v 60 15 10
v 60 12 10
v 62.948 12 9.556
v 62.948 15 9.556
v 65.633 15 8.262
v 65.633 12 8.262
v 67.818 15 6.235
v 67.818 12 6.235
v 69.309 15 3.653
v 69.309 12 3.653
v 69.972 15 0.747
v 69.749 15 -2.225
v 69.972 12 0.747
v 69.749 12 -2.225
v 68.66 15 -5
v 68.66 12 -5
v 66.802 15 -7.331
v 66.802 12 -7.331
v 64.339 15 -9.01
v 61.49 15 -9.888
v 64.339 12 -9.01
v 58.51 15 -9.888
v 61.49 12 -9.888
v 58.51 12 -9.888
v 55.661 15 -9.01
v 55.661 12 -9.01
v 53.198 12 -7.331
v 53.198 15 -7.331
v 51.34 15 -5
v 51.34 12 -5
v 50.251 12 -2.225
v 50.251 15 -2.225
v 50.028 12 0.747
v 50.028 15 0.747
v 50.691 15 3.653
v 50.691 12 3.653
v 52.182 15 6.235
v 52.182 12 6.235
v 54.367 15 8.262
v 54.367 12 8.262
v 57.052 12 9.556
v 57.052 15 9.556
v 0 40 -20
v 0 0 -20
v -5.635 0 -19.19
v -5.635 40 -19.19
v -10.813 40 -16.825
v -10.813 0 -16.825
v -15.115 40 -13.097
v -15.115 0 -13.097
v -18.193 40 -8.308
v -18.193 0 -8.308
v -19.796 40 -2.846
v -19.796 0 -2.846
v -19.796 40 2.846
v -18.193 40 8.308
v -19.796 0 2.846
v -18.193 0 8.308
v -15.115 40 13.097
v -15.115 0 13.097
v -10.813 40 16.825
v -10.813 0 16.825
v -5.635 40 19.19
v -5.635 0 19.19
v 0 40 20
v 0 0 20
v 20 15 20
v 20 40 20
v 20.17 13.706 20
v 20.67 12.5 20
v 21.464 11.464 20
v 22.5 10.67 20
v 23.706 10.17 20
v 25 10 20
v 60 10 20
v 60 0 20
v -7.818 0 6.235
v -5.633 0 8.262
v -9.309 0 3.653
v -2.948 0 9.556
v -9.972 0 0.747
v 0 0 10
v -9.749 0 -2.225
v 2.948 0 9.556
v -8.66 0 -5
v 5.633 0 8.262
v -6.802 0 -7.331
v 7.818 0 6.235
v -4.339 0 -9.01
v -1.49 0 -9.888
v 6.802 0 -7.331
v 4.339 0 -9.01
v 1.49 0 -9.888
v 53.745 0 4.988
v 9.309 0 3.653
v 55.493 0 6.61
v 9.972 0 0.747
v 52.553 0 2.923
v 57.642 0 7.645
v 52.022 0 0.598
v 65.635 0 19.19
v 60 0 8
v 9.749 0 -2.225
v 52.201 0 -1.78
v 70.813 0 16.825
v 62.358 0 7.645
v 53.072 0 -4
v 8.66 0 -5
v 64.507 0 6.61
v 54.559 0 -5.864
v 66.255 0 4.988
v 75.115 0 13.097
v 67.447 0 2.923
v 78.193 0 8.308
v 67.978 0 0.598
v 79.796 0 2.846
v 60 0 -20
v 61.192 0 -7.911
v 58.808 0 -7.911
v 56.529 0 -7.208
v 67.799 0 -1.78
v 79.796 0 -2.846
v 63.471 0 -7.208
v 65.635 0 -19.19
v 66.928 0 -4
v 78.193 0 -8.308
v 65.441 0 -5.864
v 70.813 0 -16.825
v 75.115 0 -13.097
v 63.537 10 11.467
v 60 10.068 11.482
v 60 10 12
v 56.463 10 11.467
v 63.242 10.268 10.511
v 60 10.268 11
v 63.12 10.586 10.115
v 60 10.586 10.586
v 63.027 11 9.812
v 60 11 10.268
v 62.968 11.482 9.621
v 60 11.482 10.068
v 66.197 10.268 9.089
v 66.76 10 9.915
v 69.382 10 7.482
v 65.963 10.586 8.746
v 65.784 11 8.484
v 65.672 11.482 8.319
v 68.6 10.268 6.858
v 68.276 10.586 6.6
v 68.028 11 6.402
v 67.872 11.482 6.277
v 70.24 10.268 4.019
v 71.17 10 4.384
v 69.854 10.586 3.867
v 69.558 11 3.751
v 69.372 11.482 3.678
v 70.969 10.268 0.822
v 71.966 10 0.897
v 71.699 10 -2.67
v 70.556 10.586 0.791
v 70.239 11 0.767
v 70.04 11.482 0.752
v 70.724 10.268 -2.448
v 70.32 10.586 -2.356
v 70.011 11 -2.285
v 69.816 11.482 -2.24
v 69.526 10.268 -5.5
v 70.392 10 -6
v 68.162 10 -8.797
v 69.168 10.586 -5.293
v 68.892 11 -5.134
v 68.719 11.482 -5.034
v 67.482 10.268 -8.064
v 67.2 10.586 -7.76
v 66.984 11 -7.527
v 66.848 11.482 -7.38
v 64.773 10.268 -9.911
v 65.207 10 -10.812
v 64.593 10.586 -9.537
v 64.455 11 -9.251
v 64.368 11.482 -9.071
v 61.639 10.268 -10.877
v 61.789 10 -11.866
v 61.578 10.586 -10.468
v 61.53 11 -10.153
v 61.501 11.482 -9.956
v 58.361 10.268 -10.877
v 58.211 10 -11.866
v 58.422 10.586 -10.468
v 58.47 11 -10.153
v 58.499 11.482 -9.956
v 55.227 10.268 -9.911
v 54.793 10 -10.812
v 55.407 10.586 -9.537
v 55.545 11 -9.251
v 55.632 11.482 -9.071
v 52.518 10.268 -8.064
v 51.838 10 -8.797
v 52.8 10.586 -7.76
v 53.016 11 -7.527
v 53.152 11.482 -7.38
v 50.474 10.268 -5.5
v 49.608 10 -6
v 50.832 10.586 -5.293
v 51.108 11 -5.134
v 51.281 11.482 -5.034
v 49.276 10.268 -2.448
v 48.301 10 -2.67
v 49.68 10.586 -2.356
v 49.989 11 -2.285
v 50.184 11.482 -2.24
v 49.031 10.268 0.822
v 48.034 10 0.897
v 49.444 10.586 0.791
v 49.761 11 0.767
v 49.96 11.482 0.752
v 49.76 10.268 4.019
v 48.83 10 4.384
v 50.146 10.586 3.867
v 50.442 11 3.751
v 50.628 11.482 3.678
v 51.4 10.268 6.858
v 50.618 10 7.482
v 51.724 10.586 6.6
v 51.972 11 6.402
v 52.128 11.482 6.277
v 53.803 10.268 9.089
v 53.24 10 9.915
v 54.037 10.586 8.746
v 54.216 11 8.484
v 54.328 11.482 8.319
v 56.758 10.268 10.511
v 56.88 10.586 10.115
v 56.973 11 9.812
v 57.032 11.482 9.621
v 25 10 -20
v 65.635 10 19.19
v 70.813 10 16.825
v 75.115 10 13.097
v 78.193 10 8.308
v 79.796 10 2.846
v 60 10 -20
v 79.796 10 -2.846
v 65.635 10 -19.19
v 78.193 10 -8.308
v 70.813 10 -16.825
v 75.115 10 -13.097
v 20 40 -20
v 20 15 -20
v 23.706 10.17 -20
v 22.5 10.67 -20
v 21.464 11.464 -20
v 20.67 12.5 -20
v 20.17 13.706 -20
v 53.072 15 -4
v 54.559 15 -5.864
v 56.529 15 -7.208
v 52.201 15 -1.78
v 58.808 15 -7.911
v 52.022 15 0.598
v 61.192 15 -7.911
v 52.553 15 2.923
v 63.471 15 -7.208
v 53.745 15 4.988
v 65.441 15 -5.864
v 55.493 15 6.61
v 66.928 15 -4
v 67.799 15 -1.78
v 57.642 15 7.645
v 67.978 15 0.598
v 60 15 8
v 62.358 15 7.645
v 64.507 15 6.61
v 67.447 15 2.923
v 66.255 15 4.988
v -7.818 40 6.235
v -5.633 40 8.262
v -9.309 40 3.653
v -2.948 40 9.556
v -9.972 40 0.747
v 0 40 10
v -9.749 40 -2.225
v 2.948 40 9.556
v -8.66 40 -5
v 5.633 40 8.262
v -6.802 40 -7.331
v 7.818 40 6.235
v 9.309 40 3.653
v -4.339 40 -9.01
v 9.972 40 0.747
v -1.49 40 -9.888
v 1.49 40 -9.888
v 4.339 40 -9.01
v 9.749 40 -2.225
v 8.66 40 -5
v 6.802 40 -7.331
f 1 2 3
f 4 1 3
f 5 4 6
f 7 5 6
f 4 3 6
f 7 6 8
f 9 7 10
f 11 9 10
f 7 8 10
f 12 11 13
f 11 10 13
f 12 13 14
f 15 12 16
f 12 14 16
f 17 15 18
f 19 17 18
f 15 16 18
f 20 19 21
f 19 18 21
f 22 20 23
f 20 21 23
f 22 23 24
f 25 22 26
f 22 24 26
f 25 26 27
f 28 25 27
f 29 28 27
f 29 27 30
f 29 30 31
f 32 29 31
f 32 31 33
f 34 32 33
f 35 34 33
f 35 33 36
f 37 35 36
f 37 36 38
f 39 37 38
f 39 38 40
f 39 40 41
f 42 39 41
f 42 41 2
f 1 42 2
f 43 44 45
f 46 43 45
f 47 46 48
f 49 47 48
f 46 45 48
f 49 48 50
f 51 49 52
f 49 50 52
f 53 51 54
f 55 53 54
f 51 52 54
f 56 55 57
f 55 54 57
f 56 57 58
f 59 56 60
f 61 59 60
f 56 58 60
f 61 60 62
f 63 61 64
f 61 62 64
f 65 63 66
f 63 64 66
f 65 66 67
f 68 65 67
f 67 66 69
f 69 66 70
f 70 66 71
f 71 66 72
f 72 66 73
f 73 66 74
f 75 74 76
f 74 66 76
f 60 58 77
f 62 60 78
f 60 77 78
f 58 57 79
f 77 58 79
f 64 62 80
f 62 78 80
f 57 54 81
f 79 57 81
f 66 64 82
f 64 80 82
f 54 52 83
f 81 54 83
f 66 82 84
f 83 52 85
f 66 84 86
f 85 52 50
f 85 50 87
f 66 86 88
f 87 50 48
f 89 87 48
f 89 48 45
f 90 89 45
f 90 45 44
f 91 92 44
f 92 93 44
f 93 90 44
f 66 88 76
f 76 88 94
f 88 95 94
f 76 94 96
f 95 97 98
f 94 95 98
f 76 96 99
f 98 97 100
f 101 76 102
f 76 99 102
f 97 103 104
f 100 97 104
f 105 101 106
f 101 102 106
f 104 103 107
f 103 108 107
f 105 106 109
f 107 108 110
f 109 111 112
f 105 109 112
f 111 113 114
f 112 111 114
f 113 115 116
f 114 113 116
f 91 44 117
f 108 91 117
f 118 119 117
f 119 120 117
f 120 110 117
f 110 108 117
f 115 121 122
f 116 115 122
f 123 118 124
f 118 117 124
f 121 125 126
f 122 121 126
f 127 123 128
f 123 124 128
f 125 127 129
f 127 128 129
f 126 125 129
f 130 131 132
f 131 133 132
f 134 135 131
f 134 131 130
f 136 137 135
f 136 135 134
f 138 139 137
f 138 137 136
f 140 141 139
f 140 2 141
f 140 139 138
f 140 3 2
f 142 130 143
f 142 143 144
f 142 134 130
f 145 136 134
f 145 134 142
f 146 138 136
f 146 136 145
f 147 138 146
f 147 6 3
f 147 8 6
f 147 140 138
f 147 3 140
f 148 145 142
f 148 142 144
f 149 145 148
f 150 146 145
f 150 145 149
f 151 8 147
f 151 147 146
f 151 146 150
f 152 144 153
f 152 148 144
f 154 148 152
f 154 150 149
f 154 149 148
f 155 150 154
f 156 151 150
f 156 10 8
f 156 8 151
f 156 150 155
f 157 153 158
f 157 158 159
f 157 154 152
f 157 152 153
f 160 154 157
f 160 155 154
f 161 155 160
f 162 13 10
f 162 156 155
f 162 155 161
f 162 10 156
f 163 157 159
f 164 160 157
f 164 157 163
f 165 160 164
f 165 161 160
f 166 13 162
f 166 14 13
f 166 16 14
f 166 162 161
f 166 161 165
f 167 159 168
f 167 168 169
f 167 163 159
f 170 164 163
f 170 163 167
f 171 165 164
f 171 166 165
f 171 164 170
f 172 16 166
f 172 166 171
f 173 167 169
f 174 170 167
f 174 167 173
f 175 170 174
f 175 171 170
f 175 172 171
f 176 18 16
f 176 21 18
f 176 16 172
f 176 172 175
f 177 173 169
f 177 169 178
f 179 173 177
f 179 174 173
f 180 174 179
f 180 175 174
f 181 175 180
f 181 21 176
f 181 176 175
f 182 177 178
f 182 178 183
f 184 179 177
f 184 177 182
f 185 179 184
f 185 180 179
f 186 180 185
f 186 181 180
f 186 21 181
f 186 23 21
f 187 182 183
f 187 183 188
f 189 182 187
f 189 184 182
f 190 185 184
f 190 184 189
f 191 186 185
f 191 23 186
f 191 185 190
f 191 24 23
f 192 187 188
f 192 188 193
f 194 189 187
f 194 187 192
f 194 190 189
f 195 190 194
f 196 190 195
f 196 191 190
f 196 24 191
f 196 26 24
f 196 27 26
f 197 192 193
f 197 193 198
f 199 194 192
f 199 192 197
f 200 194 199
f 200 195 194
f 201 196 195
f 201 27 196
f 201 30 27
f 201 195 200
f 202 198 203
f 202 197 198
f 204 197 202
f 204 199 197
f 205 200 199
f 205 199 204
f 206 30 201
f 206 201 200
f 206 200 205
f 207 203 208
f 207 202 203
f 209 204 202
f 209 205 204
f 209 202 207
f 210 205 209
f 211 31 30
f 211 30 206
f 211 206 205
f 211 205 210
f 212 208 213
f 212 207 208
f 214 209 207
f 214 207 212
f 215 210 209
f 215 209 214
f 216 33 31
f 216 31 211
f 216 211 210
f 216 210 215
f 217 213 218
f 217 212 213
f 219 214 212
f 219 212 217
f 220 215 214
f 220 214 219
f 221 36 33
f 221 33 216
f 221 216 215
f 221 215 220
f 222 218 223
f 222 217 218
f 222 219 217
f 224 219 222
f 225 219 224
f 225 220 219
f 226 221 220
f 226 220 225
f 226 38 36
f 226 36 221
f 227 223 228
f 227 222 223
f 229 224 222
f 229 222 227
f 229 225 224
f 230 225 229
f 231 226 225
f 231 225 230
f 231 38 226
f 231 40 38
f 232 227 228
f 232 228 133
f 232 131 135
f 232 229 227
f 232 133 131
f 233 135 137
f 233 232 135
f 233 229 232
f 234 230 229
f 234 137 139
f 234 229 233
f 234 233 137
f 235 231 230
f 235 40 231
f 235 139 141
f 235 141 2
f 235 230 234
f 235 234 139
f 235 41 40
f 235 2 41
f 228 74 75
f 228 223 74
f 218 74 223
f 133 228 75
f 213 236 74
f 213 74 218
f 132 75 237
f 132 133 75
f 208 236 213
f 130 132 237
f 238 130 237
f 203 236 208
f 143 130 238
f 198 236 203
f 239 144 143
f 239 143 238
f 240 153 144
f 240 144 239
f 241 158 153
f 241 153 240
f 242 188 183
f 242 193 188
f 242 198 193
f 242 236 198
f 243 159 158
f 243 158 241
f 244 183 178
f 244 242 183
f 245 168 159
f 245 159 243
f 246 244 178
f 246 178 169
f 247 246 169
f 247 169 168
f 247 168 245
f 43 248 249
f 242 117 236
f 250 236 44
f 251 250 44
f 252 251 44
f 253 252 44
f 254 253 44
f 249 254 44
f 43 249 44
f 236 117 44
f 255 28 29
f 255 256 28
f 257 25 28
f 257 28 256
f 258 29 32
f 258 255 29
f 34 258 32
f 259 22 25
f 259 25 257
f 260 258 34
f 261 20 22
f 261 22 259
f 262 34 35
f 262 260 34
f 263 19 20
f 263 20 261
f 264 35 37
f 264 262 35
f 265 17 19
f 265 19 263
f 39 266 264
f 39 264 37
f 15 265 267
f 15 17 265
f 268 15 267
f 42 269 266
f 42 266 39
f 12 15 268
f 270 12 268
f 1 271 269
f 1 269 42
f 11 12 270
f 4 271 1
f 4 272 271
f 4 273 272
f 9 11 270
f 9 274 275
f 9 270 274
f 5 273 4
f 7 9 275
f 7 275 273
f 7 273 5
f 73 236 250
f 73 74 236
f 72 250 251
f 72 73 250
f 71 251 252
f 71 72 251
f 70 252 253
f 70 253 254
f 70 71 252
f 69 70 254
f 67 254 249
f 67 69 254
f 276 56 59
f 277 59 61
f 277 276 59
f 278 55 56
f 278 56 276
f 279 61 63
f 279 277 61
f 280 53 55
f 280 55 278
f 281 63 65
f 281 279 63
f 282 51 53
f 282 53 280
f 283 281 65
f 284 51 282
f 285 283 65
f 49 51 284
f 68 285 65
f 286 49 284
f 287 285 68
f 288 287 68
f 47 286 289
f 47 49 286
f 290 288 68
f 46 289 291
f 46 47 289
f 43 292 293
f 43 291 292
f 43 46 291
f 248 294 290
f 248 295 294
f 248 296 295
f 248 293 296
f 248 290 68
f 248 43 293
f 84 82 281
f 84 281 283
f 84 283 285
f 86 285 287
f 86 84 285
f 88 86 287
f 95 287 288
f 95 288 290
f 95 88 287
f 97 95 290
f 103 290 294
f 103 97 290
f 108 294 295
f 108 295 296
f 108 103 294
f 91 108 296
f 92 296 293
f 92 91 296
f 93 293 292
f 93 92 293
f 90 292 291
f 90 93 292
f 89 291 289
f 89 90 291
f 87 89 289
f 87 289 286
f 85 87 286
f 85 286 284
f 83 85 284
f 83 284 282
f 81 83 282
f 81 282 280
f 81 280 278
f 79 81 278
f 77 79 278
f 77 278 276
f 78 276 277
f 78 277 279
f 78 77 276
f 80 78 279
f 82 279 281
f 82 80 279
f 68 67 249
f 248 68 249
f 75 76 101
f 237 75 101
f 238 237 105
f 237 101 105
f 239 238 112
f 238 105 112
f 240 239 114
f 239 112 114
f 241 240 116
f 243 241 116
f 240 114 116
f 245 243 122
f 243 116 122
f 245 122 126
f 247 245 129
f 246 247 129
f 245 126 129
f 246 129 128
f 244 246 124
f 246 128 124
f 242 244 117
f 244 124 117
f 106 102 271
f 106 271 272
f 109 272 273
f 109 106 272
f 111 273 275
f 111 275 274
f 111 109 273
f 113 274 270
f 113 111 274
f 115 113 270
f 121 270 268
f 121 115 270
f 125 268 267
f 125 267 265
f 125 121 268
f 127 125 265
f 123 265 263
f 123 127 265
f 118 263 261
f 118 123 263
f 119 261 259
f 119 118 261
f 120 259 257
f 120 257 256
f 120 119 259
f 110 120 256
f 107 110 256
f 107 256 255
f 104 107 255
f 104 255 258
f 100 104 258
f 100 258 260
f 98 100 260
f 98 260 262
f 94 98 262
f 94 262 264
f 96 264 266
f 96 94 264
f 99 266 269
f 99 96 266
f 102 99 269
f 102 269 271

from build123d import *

# Parameters (mm, degrees)
SKETCH1_R           = 10
BOSS_EXTRUDE1_DEPTH = 10
SKETCH1_4_R         = 10
SKETCH1_4_R_2       = 8
BOSS_EXTRUDE2_DEPTH = 15
SKETCH1_5_R         = 10
BOSS_EXTRUDE3_DEPTH = 40
FILLET1_R           = 5
FILLET2_R           = 2


with BuildPart() as part:
    # Sketch1 → Boss-Extrude1 (new body)
    with BuildSketch(Plane(origin=(0, 0, 0), x_dir=(1, 0, 0), z_dir=(0, 1, 0))):
        with BuildLine():
            Line((60, 20), (20, 20))
            Line((20, 20), (20, -20))
            Line((20, -20), (60, -20))
            ThreePointArc((60, -20), (80, 0), (60, 20))
        make_face()
        with Locations((60, 0)):
            Circle(SKETCH1_R, mode=Mode.SUBTRACT)
    extrude(amount=BOSS_EXTRUDE1_DEPTH)

    # Sketch1<4> → Boss-Extrude2 (add)
    with BuildSketch(Plane(origin=(0, 0, 0), x_dir=(1, 0, 0), z_dir=(0, 1, 0))):
        with Locations((60, 0)):
            Circle(SKETCH1_4_R)
        with Locations((60, 0)):
            Circle(SKETCH1_4_R_2, mode=Mode.SUBTRACT)
    extrude(amount=BOSS_EXTRUDE2_DEPTH)

    # Sketch1<5> → Boss-Extrude3 (add)
    with BuildSketch(Plane(origin=(0, 0, 0), x_dir=(1, 0, 0), z_dir=(0, 1, 0))):
        with BuildLine():
            Line((20, 20), (0, 20))
            ThreePointArc((0, 20), (-20, 0), (0, -20))
            Line((0, -20), (20, -20))
            Line((20, -20), (20, 20))
        make_face()
        Circle(SKETCH1_5_R, mode=Mode.SUBTRACT)
    extrude(amount=BOSS_EXTRUDE3_DEPTH)

    # Fillet1
    fillet1_edges = [part.edges().sort_by_distance(p)[0] for p in [
        (20, 10, 0),
    ]]
    fillet(fillet1_edges, radius=FILLET1_R)

    # Fillet2
    fillet2_edges = [part.edges().sort_by_distance(p)[0] for p in [
        (50, 10, 0),
    ]]
    fillet(fillet2_edges, radius=FILLET2_R)


solid = part.part
